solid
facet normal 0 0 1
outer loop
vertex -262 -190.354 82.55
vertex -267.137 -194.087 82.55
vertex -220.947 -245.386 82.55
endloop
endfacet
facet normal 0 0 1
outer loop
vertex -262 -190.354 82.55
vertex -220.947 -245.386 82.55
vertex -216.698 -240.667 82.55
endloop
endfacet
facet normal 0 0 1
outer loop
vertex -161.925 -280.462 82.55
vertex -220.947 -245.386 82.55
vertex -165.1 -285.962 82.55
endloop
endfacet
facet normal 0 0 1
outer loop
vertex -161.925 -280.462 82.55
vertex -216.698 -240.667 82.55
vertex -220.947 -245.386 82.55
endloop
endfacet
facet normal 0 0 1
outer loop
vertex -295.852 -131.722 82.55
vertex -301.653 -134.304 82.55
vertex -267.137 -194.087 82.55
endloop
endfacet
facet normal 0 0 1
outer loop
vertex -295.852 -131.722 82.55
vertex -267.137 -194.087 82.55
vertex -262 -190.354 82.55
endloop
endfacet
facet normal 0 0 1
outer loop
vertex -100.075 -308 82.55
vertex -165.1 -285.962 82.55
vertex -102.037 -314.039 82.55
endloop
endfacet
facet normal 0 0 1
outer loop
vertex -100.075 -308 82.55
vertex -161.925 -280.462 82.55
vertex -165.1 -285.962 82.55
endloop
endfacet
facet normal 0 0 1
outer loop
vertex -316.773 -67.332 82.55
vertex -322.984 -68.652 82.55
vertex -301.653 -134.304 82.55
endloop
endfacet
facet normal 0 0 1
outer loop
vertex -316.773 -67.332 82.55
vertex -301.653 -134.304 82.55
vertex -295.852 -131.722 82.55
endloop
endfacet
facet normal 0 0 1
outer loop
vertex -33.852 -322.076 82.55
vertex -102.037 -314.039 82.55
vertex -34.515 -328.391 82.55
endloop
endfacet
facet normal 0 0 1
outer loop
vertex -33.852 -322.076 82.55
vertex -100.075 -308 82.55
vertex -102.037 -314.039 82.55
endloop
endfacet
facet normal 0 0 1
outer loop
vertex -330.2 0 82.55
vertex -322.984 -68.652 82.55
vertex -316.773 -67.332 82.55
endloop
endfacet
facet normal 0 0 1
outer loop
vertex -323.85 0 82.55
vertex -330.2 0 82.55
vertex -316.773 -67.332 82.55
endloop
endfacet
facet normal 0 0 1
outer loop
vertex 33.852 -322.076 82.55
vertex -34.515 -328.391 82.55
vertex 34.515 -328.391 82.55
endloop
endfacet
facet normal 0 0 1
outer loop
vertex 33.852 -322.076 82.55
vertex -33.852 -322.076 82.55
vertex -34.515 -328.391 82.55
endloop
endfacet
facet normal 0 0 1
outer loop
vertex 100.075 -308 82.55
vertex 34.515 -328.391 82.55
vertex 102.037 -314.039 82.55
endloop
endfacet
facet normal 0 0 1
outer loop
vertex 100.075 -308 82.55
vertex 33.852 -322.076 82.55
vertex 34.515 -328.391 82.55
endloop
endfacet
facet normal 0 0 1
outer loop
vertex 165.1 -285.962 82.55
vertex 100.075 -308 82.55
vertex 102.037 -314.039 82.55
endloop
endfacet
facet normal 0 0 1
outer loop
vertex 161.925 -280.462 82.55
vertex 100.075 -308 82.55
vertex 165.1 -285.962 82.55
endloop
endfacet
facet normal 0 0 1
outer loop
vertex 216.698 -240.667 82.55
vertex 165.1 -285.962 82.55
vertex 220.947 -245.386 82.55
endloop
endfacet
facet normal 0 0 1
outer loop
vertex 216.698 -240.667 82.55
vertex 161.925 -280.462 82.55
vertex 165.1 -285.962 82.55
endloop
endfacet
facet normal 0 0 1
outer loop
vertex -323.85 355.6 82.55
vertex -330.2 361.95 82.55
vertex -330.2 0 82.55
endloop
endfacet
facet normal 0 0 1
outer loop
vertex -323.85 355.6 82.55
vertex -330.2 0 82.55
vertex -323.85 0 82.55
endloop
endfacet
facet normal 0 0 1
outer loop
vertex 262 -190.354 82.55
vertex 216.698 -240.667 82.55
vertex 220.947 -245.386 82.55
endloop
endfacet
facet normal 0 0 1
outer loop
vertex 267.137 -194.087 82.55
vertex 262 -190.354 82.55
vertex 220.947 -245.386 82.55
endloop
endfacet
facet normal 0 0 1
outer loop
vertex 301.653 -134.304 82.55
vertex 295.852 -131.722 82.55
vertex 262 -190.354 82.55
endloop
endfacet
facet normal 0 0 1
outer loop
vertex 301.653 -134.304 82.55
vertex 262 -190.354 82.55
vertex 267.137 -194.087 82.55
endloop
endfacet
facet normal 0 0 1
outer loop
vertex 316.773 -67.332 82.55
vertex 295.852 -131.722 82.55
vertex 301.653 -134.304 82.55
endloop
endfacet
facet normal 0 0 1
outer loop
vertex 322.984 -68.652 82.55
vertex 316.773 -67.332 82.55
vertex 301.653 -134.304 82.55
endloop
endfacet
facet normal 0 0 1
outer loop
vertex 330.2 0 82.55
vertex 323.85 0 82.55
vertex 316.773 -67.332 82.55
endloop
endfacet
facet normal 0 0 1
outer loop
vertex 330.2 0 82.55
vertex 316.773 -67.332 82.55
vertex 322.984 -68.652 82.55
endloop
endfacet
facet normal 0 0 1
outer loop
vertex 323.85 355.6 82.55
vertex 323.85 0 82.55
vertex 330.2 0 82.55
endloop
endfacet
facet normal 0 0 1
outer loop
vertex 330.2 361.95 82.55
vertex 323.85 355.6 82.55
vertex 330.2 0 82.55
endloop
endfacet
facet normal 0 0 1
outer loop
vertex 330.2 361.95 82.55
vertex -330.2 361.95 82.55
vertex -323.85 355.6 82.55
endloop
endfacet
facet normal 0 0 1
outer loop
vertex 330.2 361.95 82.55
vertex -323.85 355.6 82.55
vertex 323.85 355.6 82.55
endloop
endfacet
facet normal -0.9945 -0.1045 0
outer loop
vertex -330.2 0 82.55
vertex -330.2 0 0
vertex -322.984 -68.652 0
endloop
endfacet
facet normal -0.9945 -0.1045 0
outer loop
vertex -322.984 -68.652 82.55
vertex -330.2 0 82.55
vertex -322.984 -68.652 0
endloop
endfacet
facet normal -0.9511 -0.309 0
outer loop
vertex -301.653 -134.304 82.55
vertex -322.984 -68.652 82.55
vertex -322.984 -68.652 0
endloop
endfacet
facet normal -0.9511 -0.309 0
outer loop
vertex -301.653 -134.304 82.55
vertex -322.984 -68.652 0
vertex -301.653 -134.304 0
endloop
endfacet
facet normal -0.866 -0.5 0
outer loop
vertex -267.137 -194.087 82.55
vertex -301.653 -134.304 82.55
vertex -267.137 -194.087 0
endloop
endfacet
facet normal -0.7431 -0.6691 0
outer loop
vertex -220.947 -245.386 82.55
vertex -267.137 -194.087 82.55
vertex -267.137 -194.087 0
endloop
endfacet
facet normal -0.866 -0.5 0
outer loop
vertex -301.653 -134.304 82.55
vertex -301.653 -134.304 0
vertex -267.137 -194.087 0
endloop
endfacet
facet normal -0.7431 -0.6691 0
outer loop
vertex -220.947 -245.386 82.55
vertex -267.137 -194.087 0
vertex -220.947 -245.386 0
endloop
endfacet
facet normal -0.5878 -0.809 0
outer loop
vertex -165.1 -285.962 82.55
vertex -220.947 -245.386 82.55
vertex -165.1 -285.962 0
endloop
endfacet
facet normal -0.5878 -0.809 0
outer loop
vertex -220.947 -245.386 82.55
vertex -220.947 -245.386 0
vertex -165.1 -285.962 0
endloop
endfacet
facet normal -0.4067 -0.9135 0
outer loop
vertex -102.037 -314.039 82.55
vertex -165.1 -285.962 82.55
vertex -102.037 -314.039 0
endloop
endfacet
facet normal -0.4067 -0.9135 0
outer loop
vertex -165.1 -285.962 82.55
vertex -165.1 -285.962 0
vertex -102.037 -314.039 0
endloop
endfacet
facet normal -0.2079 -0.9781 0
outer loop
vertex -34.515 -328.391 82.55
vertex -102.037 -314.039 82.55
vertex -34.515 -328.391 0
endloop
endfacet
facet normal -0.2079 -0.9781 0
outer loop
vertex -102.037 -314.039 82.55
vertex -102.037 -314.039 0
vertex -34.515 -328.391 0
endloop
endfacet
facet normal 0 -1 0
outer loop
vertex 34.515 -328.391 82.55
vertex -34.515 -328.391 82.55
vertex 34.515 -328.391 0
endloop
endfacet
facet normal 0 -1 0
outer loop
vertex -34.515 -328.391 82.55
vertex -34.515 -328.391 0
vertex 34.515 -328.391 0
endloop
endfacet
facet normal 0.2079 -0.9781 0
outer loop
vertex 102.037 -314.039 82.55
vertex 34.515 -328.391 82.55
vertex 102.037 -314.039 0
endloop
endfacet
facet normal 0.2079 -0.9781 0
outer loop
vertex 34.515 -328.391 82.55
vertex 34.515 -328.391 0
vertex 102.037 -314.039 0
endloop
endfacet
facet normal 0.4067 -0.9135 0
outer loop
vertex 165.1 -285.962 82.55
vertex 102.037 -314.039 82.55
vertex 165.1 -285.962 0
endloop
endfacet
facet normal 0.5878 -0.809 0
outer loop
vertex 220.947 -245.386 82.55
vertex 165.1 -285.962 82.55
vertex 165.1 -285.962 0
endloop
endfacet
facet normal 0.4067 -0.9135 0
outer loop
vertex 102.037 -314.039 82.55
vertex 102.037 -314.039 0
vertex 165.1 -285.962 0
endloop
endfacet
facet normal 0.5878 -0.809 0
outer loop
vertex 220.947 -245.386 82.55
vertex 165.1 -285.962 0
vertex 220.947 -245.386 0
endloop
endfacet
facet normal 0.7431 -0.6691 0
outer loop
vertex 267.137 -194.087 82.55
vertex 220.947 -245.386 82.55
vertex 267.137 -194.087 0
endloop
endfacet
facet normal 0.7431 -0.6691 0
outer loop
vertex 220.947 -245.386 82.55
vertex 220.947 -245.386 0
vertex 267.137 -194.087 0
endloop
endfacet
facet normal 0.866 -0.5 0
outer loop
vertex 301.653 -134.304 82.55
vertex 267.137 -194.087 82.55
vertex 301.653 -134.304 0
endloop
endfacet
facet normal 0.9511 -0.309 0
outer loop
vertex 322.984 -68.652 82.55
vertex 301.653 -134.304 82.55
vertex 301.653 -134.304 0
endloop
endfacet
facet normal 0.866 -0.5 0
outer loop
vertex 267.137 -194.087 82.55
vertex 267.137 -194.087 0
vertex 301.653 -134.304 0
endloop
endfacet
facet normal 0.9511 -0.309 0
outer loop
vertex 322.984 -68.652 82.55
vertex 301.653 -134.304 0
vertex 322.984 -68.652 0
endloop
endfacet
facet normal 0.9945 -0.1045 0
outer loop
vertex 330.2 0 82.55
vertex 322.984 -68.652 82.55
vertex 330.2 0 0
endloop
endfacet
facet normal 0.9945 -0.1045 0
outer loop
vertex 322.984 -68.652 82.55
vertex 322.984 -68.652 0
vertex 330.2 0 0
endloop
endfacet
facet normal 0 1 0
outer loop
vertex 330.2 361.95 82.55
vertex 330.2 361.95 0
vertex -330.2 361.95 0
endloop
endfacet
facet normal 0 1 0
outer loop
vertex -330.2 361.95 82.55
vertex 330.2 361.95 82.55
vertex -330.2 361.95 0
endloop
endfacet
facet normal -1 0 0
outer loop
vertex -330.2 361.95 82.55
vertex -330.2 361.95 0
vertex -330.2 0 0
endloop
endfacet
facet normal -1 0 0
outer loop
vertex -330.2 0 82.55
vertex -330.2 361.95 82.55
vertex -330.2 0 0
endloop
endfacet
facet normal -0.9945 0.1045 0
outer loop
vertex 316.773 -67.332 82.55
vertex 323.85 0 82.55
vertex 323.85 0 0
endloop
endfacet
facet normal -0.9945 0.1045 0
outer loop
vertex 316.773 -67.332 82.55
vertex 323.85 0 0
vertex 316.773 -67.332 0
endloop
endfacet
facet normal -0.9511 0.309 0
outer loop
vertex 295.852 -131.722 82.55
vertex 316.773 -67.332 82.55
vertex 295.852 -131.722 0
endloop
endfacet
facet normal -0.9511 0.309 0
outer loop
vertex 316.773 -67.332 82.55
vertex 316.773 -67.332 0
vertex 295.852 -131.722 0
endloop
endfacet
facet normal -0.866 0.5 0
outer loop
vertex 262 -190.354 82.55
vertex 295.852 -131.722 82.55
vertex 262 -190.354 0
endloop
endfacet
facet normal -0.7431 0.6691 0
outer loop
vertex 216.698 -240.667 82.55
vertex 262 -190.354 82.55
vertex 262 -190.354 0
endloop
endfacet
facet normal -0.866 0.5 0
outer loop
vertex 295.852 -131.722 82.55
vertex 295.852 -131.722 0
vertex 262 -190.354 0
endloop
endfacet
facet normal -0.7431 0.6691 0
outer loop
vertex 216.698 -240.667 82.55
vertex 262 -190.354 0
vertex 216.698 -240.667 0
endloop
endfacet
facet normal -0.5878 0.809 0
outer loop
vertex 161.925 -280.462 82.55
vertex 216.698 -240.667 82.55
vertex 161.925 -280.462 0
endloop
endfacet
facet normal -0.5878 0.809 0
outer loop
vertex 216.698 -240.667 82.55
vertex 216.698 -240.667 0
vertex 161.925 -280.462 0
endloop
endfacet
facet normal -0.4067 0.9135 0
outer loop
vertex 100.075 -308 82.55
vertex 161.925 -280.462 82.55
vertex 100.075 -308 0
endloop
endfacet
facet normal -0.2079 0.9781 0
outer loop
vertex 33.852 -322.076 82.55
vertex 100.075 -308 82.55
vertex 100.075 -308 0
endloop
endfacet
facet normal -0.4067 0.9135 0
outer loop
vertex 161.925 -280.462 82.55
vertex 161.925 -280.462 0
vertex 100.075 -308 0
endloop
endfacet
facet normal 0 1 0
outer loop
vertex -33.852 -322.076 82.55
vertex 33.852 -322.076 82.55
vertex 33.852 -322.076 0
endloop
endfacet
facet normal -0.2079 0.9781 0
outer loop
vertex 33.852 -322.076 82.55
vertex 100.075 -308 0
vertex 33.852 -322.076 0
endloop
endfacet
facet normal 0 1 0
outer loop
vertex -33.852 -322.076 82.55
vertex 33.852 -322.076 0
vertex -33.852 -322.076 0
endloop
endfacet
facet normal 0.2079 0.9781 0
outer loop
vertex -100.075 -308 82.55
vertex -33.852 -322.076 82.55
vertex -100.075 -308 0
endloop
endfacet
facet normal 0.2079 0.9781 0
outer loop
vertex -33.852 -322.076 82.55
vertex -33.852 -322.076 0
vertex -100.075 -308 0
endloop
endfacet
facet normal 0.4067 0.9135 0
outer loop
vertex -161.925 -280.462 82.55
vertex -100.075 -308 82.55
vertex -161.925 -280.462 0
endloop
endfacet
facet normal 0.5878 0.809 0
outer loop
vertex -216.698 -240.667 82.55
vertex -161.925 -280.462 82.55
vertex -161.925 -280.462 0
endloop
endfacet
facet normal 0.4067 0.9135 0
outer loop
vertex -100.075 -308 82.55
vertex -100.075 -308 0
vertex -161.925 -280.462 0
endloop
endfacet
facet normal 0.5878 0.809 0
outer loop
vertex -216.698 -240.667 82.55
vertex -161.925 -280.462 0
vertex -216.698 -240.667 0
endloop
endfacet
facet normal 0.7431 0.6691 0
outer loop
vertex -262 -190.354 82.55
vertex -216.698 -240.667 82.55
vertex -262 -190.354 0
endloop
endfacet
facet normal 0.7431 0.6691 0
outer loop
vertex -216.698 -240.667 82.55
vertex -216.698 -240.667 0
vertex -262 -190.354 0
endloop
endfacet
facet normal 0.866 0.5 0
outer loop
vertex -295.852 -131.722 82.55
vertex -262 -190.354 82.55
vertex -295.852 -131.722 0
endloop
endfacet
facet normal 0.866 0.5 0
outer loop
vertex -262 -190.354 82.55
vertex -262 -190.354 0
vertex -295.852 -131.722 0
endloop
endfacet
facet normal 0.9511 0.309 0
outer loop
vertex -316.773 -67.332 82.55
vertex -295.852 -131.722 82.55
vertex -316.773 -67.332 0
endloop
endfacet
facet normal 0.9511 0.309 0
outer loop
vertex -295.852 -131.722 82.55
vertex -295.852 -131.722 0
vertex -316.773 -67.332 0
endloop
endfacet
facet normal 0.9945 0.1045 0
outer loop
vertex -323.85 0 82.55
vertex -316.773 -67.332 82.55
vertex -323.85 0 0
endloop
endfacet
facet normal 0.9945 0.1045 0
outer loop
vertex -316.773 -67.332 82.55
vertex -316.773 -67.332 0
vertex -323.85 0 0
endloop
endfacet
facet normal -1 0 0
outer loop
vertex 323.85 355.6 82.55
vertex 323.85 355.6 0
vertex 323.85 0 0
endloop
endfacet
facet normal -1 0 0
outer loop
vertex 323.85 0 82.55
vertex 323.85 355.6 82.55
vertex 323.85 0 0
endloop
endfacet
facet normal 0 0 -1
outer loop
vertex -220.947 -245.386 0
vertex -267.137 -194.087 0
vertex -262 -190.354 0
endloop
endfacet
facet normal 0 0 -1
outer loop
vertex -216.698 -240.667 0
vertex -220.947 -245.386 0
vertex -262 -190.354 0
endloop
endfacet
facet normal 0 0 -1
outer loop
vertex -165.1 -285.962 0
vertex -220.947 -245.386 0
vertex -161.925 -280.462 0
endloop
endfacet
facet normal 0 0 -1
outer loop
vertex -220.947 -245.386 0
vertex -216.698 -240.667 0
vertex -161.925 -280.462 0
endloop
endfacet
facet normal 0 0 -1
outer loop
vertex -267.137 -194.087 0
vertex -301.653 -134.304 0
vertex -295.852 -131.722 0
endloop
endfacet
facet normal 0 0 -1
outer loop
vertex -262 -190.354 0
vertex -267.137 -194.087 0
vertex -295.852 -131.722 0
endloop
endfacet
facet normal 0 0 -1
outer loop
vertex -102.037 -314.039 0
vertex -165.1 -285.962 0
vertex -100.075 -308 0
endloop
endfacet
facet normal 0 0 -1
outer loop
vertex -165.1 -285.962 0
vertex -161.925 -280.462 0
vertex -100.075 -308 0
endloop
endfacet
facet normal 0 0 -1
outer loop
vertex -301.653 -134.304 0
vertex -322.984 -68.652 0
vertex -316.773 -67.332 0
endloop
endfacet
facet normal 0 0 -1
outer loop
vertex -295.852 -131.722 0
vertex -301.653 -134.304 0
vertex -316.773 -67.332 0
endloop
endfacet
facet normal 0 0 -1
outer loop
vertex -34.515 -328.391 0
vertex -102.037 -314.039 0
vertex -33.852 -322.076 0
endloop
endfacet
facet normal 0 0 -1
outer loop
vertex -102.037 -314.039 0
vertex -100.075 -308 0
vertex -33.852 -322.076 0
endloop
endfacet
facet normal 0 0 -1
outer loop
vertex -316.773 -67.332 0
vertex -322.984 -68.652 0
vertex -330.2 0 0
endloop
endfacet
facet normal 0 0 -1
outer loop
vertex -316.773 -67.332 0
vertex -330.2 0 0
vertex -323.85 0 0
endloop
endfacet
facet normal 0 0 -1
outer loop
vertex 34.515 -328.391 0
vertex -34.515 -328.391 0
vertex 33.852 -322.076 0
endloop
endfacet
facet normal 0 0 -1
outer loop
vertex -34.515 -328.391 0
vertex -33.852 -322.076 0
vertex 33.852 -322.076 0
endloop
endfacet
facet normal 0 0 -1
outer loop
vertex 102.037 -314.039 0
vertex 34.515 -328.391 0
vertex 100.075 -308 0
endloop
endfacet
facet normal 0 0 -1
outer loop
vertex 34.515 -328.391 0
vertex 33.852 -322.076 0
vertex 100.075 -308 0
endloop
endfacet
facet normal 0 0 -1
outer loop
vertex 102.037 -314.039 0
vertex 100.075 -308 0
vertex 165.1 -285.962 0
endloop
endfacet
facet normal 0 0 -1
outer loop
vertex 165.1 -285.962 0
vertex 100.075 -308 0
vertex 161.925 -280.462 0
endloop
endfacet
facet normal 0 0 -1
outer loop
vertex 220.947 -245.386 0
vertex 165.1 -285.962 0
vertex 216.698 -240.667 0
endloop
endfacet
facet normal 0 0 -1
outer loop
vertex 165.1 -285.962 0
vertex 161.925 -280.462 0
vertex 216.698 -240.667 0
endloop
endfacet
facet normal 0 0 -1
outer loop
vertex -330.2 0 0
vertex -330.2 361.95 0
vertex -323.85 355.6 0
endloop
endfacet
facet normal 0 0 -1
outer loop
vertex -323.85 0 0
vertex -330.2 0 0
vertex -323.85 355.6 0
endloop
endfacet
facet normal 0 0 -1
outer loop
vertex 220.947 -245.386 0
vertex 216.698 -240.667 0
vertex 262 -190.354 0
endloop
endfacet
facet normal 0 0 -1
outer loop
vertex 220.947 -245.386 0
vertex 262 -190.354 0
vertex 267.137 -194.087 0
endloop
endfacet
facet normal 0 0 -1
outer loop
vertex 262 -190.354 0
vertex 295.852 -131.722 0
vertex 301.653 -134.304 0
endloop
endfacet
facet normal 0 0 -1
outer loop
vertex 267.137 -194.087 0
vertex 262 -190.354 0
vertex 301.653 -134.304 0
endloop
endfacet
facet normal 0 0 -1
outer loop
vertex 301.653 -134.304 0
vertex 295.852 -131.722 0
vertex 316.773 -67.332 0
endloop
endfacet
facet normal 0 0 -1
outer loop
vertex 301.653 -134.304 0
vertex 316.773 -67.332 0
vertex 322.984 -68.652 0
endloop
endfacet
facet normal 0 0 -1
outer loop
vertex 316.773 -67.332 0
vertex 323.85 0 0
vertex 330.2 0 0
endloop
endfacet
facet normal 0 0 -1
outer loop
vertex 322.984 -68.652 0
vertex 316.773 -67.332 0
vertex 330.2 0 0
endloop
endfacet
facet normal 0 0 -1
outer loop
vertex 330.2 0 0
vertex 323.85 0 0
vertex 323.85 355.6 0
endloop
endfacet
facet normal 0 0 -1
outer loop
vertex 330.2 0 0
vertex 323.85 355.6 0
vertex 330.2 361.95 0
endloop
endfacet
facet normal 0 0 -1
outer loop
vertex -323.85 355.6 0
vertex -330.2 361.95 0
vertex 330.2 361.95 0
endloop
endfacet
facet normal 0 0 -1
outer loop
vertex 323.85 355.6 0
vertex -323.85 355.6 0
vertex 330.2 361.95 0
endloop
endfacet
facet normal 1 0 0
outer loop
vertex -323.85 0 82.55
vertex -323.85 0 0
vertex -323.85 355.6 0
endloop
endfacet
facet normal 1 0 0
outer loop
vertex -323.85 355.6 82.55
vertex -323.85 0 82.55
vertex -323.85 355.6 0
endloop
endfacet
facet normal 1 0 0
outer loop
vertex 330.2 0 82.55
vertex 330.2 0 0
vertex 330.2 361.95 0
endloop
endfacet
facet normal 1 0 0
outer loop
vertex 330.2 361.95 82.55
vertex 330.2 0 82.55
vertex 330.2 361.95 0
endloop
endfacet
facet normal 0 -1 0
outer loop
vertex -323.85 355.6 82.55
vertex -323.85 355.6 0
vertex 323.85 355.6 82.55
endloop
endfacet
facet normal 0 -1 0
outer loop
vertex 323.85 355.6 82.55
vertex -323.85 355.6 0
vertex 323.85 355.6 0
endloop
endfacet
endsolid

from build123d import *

# Parameters (mm, degrees)
F1_DEPTH = 82.55


with BuildPart() as f1:
    # F0 (on Top) → F1 (new body)
    with BuildSketch(Plane.XY):
        with BuildLine():
            ThreePointArc((-330.2, 0), (0, -330.2), (330.2, 0))
            Line((330.2, 0), (330.2, 361.95))
            Line((330.2, 361.95), (-330.2, 361.95))
            Line((-330.2, 361.95), (-330.2, 0))
        make_face()
        with BuildLine():
            ThreePointArc((323.85, 0), (0, -323.85), (-323.85, 0))
            Line((-323.85, 0), (-323.85, 355.6))
            Line((-323.85, 355.6), (323.85, 355.6))
            Line((323.85, 355.6), (323.85, 0))
        make_face(mode=Mode.SUBTRACT)
    extrude(amount=F1_DEPTH)


solid = f1.part
